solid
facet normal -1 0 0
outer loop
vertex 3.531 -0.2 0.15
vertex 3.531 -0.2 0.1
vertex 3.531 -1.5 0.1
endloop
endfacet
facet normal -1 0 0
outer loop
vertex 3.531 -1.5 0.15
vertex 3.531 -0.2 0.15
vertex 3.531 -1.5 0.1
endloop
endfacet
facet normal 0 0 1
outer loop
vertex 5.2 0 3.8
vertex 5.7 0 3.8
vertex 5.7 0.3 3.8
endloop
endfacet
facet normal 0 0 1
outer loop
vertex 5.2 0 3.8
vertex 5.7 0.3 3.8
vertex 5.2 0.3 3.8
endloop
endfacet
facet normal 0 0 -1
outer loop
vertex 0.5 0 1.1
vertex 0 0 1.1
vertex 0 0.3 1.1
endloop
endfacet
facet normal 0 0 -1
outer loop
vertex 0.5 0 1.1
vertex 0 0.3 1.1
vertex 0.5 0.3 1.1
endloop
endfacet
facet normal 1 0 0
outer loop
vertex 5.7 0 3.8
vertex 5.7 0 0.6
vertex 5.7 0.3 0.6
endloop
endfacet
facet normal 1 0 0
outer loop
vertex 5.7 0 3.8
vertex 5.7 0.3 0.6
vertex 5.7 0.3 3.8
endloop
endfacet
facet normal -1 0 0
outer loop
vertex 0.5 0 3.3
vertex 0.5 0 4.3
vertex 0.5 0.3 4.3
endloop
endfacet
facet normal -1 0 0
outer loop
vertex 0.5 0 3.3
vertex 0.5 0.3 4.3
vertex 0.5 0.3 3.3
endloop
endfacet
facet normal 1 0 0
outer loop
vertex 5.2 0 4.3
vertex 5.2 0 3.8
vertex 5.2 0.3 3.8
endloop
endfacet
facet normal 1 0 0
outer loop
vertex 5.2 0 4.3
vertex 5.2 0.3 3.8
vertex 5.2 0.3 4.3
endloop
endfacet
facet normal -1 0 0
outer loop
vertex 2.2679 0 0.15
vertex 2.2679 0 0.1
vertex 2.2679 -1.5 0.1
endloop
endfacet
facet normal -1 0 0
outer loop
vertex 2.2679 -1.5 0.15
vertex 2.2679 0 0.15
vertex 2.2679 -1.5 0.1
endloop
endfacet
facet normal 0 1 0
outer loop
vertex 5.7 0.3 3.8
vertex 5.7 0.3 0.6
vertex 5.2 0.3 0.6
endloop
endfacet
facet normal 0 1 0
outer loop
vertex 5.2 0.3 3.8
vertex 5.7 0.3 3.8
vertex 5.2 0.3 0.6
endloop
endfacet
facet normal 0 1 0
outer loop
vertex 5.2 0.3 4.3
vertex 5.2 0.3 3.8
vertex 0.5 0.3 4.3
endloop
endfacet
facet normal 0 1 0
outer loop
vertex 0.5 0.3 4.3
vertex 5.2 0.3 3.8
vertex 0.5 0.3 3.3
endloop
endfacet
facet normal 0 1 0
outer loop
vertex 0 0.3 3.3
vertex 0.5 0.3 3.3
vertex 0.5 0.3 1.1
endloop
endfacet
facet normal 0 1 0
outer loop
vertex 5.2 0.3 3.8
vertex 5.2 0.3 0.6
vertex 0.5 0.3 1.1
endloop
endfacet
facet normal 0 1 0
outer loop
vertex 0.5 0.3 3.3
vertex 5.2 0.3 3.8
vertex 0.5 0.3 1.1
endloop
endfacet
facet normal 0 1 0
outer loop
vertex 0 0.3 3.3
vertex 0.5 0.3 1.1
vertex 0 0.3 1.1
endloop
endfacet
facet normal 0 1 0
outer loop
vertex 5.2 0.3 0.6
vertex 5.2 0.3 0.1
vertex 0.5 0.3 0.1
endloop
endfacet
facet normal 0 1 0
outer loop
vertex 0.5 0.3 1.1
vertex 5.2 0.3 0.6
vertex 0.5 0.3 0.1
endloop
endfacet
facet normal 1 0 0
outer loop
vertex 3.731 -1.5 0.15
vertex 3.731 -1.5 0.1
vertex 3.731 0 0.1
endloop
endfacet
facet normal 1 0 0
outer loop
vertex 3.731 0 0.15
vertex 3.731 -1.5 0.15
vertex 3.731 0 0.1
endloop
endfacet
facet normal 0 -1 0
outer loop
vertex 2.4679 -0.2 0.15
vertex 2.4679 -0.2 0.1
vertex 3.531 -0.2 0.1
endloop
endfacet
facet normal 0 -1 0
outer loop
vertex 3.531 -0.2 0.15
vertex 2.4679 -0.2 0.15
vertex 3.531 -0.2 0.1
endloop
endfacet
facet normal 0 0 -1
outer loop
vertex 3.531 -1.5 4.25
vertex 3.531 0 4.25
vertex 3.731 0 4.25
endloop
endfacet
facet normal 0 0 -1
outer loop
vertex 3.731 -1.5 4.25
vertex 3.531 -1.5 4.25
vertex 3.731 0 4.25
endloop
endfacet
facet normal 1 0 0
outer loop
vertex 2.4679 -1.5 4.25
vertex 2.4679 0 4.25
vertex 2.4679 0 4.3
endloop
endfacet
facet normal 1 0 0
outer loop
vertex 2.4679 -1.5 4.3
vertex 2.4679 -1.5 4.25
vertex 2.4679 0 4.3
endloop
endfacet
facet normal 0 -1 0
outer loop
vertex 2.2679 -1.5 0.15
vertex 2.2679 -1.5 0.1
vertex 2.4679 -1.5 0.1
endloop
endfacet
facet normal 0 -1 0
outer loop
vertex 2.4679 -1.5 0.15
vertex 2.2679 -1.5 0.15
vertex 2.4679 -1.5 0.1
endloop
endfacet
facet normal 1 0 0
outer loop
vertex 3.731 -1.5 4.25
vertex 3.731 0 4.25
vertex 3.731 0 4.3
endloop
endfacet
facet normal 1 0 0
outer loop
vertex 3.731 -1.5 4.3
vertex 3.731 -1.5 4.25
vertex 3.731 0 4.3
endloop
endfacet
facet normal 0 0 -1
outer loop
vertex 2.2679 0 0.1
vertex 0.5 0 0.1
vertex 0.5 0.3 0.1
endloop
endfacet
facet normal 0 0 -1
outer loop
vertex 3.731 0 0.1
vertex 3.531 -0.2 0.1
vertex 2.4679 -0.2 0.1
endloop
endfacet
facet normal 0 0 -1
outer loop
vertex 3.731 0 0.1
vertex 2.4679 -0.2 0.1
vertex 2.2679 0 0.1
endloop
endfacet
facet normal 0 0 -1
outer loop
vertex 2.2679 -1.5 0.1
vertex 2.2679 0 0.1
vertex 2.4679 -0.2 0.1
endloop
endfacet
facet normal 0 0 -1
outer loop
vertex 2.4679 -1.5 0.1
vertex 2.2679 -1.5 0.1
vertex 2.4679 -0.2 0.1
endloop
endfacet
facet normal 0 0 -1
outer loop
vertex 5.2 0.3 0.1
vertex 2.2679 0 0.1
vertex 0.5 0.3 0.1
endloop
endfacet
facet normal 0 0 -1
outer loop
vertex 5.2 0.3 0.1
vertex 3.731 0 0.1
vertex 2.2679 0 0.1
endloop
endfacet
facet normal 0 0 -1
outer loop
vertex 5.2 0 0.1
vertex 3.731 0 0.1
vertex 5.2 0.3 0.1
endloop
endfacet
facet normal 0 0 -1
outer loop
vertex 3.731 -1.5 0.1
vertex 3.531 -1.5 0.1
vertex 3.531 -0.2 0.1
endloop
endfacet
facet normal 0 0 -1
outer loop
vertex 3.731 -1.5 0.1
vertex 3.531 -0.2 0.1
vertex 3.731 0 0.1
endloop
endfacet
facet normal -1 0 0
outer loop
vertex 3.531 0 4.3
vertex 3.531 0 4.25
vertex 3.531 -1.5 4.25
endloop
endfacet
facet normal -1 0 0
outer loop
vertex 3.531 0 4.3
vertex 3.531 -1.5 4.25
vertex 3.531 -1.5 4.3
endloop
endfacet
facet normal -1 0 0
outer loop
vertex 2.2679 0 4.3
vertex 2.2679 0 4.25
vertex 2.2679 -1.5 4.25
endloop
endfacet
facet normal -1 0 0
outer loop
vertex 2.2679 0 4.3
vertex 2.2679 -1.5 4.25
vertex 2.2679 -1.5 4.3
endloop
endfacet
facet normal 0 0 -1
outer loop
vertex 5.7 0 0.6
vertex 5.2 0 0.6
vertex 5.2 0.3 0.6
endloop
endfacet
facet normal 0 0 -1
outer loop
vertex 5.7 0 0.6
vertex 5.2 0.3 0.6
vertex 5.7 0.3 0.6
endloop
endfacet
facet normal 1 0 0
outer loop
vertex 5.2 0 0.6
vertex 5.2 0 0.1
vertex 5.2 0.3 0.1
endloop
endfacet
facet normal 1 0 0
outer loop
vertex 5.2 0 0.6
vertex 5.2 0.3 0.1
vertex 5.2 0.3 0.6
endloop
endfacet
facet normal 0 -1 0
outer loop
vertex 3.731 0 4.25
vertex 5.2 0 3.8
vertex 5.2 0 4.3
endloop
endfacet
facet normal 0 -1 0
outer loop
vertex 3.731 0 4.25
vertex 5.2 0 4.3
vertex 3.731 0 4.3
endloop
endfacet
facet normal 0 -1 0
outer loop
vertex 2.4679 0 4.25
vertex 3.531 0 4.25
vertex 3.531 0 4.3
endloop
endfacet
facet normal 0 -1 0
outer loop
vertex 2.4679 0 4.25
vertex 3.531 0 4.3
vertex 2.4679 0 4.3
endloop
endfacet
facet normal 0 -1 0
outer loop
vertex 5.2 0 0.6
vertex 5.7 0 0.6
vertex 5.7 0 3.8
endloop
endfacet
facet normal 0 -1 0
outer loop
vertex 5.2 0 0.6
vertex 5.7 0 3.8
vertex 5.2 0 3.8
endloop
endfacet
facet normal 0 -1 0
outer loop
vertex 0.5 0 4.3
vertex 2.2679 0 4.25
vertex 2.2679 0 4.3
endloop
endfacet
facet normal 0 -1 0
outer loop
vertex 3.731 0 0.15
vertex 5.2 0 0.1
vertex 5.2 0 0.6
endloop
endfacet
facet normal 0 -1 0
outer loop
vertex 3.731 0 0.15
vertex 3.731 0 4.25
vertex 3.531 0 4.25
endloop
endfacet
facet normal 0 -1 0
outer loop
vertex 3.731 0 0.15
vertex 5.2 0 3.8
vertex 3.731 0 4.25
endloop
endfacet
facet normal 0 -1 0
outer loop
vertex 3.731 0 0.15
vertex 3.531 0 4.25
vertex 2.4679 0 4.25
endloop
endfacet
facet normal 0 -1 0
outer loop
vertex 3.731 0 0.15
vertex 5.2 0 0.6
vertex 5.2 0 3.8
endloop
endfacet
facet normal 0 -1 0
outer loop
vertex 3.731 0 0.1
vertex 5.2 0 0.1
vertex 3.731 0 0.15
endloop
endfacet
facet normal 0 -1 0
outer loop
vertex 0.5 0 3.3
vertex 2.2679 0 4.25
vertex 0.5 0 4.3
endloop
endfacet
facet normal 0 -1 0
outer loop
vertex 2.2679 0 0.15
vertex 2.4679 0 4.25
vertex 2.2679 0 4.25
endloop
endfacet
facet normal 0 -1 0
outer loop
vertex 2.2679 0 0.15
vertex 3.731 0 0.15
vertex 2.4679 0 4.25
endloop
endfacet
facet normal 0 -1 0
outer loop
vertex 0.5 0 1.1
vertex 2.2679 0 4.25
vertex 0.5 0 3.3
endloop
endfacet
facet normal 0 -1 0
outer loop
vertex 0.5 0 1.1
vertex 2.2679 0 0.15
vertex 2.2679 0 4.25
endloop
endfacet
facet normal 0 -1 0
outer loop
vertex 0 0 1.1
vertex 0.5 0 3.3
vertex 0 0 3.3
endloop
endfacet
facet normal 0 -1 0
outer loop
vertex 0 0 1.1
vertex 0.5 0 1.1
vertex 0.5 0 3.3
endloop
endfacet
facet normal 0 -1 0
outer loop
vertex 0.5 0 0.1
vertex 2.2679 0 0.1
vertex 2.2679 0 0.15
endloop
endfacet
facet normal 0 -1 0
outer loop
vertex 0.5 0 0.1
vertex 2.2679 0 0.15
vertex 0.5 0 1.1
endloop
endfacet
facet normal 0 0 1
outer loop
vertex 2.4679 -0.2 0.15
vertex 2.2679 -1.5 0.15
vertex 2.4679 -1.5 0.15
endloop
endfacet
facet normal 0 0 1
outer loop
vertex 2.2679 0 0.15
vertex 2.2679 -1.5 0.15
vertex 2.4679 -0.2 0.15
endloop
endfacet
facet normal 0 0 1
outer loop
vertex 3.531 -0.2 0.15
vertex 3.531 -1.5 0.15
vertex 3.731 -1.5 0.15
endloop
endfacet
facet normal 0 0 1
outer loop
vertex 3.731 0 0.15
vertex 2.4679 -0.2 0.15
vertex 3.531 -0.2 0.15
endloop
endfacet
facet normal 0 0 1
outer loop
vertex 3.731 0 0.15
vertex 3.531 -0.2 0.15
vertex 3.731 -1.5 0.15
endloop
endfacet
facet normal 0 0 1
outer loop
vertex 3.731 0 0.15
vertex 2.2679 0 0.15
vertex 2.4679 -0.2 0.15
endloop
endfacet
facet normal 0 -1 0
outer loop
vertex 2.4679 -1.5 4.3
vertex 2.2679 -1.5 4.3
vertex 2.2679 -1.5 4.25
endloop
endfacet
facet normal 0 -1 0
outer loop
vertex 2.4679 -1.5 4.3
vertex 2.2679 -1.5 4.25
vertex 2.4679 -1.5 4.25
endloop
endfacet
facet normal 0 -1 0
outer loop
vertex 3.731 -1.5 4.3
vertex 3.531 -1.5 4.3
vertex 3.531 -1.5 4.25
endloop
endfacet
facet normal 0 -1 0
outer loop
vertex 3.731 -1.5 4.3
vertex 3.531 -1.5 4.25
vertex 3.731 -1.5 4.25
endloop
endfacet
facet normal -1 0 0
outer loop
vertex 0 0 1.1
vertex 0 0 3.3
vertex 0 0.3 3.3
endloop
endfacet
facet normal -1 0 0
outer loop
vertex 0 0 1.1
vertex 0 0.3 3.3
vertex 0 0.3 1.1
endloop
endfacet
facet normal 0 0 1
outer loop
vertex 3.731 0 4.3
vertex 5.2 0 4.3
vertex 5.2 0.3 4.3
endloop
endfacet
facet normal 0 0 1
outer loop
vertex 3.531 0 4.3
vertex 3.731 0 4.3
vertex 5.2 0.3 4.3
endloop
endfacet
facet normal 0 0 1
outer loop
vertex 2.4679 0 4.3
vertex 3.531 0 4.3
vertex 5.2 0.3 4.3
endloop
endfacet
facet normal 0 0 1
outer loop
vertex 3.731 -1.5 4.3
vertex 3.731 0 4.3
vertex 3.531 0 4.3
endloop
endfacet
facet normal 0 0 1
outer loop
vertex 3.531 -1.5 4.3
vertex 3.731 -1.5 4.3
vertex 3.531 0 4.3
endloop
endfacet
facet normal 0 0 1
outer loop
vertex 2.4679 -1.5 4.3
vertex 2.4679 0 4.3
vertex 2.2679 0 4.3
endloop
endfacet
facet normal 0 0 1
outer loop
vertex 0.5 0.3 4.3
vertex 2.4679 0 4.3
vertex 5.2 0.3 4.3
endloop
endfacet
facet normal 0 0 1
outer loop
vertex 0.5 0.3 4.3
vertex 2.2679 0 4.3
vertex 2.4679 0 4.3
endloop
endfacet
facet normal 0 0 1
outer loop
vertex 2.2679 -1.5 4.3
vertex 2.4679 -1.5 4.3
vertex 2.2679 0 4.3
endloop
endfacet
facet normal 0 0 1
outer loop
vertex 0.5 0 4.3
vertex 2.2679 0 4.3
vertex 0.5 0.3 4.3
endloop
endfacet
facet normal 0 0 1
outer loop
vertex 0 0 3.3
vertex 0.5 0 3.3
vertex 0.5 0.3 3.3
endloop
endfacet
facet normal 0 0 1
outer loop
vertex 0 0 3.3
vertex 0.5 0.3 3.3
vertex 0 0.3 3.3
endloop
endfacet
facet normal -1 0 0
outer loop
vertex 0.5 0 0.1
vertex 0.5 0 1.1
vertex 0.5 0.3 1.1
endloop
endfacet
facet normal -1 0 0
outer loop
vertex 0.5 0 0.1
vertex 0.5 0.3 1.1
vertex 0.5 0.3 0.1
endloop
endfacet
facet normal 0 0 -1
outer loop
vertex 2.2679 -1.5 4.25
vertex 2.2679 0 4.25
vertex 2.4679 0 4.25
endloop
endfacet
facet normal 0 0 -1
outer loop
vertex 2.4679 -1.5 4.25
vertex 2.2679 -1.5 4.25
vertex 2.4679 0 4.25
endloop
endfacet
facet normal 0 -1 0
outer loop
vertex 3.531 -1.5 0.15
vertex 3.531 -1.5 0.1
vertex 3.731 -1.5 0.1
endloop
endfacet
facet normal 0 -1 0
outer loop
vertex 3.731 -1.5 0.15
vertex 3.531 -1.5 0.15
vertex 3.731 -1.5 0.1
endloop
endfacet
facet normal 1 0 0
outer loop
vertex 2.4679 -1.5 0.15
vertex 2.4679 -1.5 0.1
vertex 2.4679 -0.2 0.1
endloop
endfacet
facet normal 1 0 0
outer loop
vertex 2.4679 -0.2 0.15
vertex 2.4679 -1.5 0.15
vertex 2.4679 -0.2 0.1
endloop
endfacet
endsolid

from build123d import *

# Parameters (mm, degrees)
BOSS_EXTRUDE1_DEPTH = 0.3
BOSS_EXTRUDE2_DEPTH = 0.05
SKETCH4_W           = 0.2
SKETCH4_H           = 0.05
BOSS_EXTRUDE3_DEPTH = 1.5


with BuildPart() as part:
    # Sketch1 → Boss-Extrude1 (new body)
    with BuildSketch(Plane(origin=(0, 0, 0), x_dir=(1, 0, 0), z_dir=(0, 1, 0))):
        Polygon((0, -1.1), (0.5, -1.1), (0.5, -0.1), (5.2, -0.1), (5.2, -0.6), (5.7, -0.6), (5.7, -3.8), (5.2, -3.8), (5.2, -4.3), (0.5, -4.3), (0.5, -3.3), (0, -3.3), align=None)
    extrude(amount=BOSS_EXTRUDE1_DEPTH)

    # Sketch2 → Boss-Extrude2 (add)
    with BuildSketch(Plane(origin=(0, 0, 0.1), x_dir=(-1, 0, 0), z_dir=(0, 0, -1))):
        Polygon((-3.731039035, 0), (-2.267900634, 0), (-2.267900634, -1.5), (-2.467900634, -1.5), (-2.467900634, -0.2), (-3.531039035, -0.2), (-3.531039035, -1.5), (-3.731039035, -1.5), align=None)
    extrude(amount=-BOSS_EXTRUDE2_DEPTH)

    # Sketch4 → Boss-Extrude3 (add)
    with BuildSketch(Plane.XZ):
        with Locations((2.367900634, 4.275)):
            Rectangle(SKETCH4_W, SKETCH4_H)
        with Locations((3.631039035, 4.275)):
            Rectangle(SKETCH4_W, SKETCH4_H)
    extrude(amount=BOSS_EXTRUDE3_DEPTH)


solid = part.part
